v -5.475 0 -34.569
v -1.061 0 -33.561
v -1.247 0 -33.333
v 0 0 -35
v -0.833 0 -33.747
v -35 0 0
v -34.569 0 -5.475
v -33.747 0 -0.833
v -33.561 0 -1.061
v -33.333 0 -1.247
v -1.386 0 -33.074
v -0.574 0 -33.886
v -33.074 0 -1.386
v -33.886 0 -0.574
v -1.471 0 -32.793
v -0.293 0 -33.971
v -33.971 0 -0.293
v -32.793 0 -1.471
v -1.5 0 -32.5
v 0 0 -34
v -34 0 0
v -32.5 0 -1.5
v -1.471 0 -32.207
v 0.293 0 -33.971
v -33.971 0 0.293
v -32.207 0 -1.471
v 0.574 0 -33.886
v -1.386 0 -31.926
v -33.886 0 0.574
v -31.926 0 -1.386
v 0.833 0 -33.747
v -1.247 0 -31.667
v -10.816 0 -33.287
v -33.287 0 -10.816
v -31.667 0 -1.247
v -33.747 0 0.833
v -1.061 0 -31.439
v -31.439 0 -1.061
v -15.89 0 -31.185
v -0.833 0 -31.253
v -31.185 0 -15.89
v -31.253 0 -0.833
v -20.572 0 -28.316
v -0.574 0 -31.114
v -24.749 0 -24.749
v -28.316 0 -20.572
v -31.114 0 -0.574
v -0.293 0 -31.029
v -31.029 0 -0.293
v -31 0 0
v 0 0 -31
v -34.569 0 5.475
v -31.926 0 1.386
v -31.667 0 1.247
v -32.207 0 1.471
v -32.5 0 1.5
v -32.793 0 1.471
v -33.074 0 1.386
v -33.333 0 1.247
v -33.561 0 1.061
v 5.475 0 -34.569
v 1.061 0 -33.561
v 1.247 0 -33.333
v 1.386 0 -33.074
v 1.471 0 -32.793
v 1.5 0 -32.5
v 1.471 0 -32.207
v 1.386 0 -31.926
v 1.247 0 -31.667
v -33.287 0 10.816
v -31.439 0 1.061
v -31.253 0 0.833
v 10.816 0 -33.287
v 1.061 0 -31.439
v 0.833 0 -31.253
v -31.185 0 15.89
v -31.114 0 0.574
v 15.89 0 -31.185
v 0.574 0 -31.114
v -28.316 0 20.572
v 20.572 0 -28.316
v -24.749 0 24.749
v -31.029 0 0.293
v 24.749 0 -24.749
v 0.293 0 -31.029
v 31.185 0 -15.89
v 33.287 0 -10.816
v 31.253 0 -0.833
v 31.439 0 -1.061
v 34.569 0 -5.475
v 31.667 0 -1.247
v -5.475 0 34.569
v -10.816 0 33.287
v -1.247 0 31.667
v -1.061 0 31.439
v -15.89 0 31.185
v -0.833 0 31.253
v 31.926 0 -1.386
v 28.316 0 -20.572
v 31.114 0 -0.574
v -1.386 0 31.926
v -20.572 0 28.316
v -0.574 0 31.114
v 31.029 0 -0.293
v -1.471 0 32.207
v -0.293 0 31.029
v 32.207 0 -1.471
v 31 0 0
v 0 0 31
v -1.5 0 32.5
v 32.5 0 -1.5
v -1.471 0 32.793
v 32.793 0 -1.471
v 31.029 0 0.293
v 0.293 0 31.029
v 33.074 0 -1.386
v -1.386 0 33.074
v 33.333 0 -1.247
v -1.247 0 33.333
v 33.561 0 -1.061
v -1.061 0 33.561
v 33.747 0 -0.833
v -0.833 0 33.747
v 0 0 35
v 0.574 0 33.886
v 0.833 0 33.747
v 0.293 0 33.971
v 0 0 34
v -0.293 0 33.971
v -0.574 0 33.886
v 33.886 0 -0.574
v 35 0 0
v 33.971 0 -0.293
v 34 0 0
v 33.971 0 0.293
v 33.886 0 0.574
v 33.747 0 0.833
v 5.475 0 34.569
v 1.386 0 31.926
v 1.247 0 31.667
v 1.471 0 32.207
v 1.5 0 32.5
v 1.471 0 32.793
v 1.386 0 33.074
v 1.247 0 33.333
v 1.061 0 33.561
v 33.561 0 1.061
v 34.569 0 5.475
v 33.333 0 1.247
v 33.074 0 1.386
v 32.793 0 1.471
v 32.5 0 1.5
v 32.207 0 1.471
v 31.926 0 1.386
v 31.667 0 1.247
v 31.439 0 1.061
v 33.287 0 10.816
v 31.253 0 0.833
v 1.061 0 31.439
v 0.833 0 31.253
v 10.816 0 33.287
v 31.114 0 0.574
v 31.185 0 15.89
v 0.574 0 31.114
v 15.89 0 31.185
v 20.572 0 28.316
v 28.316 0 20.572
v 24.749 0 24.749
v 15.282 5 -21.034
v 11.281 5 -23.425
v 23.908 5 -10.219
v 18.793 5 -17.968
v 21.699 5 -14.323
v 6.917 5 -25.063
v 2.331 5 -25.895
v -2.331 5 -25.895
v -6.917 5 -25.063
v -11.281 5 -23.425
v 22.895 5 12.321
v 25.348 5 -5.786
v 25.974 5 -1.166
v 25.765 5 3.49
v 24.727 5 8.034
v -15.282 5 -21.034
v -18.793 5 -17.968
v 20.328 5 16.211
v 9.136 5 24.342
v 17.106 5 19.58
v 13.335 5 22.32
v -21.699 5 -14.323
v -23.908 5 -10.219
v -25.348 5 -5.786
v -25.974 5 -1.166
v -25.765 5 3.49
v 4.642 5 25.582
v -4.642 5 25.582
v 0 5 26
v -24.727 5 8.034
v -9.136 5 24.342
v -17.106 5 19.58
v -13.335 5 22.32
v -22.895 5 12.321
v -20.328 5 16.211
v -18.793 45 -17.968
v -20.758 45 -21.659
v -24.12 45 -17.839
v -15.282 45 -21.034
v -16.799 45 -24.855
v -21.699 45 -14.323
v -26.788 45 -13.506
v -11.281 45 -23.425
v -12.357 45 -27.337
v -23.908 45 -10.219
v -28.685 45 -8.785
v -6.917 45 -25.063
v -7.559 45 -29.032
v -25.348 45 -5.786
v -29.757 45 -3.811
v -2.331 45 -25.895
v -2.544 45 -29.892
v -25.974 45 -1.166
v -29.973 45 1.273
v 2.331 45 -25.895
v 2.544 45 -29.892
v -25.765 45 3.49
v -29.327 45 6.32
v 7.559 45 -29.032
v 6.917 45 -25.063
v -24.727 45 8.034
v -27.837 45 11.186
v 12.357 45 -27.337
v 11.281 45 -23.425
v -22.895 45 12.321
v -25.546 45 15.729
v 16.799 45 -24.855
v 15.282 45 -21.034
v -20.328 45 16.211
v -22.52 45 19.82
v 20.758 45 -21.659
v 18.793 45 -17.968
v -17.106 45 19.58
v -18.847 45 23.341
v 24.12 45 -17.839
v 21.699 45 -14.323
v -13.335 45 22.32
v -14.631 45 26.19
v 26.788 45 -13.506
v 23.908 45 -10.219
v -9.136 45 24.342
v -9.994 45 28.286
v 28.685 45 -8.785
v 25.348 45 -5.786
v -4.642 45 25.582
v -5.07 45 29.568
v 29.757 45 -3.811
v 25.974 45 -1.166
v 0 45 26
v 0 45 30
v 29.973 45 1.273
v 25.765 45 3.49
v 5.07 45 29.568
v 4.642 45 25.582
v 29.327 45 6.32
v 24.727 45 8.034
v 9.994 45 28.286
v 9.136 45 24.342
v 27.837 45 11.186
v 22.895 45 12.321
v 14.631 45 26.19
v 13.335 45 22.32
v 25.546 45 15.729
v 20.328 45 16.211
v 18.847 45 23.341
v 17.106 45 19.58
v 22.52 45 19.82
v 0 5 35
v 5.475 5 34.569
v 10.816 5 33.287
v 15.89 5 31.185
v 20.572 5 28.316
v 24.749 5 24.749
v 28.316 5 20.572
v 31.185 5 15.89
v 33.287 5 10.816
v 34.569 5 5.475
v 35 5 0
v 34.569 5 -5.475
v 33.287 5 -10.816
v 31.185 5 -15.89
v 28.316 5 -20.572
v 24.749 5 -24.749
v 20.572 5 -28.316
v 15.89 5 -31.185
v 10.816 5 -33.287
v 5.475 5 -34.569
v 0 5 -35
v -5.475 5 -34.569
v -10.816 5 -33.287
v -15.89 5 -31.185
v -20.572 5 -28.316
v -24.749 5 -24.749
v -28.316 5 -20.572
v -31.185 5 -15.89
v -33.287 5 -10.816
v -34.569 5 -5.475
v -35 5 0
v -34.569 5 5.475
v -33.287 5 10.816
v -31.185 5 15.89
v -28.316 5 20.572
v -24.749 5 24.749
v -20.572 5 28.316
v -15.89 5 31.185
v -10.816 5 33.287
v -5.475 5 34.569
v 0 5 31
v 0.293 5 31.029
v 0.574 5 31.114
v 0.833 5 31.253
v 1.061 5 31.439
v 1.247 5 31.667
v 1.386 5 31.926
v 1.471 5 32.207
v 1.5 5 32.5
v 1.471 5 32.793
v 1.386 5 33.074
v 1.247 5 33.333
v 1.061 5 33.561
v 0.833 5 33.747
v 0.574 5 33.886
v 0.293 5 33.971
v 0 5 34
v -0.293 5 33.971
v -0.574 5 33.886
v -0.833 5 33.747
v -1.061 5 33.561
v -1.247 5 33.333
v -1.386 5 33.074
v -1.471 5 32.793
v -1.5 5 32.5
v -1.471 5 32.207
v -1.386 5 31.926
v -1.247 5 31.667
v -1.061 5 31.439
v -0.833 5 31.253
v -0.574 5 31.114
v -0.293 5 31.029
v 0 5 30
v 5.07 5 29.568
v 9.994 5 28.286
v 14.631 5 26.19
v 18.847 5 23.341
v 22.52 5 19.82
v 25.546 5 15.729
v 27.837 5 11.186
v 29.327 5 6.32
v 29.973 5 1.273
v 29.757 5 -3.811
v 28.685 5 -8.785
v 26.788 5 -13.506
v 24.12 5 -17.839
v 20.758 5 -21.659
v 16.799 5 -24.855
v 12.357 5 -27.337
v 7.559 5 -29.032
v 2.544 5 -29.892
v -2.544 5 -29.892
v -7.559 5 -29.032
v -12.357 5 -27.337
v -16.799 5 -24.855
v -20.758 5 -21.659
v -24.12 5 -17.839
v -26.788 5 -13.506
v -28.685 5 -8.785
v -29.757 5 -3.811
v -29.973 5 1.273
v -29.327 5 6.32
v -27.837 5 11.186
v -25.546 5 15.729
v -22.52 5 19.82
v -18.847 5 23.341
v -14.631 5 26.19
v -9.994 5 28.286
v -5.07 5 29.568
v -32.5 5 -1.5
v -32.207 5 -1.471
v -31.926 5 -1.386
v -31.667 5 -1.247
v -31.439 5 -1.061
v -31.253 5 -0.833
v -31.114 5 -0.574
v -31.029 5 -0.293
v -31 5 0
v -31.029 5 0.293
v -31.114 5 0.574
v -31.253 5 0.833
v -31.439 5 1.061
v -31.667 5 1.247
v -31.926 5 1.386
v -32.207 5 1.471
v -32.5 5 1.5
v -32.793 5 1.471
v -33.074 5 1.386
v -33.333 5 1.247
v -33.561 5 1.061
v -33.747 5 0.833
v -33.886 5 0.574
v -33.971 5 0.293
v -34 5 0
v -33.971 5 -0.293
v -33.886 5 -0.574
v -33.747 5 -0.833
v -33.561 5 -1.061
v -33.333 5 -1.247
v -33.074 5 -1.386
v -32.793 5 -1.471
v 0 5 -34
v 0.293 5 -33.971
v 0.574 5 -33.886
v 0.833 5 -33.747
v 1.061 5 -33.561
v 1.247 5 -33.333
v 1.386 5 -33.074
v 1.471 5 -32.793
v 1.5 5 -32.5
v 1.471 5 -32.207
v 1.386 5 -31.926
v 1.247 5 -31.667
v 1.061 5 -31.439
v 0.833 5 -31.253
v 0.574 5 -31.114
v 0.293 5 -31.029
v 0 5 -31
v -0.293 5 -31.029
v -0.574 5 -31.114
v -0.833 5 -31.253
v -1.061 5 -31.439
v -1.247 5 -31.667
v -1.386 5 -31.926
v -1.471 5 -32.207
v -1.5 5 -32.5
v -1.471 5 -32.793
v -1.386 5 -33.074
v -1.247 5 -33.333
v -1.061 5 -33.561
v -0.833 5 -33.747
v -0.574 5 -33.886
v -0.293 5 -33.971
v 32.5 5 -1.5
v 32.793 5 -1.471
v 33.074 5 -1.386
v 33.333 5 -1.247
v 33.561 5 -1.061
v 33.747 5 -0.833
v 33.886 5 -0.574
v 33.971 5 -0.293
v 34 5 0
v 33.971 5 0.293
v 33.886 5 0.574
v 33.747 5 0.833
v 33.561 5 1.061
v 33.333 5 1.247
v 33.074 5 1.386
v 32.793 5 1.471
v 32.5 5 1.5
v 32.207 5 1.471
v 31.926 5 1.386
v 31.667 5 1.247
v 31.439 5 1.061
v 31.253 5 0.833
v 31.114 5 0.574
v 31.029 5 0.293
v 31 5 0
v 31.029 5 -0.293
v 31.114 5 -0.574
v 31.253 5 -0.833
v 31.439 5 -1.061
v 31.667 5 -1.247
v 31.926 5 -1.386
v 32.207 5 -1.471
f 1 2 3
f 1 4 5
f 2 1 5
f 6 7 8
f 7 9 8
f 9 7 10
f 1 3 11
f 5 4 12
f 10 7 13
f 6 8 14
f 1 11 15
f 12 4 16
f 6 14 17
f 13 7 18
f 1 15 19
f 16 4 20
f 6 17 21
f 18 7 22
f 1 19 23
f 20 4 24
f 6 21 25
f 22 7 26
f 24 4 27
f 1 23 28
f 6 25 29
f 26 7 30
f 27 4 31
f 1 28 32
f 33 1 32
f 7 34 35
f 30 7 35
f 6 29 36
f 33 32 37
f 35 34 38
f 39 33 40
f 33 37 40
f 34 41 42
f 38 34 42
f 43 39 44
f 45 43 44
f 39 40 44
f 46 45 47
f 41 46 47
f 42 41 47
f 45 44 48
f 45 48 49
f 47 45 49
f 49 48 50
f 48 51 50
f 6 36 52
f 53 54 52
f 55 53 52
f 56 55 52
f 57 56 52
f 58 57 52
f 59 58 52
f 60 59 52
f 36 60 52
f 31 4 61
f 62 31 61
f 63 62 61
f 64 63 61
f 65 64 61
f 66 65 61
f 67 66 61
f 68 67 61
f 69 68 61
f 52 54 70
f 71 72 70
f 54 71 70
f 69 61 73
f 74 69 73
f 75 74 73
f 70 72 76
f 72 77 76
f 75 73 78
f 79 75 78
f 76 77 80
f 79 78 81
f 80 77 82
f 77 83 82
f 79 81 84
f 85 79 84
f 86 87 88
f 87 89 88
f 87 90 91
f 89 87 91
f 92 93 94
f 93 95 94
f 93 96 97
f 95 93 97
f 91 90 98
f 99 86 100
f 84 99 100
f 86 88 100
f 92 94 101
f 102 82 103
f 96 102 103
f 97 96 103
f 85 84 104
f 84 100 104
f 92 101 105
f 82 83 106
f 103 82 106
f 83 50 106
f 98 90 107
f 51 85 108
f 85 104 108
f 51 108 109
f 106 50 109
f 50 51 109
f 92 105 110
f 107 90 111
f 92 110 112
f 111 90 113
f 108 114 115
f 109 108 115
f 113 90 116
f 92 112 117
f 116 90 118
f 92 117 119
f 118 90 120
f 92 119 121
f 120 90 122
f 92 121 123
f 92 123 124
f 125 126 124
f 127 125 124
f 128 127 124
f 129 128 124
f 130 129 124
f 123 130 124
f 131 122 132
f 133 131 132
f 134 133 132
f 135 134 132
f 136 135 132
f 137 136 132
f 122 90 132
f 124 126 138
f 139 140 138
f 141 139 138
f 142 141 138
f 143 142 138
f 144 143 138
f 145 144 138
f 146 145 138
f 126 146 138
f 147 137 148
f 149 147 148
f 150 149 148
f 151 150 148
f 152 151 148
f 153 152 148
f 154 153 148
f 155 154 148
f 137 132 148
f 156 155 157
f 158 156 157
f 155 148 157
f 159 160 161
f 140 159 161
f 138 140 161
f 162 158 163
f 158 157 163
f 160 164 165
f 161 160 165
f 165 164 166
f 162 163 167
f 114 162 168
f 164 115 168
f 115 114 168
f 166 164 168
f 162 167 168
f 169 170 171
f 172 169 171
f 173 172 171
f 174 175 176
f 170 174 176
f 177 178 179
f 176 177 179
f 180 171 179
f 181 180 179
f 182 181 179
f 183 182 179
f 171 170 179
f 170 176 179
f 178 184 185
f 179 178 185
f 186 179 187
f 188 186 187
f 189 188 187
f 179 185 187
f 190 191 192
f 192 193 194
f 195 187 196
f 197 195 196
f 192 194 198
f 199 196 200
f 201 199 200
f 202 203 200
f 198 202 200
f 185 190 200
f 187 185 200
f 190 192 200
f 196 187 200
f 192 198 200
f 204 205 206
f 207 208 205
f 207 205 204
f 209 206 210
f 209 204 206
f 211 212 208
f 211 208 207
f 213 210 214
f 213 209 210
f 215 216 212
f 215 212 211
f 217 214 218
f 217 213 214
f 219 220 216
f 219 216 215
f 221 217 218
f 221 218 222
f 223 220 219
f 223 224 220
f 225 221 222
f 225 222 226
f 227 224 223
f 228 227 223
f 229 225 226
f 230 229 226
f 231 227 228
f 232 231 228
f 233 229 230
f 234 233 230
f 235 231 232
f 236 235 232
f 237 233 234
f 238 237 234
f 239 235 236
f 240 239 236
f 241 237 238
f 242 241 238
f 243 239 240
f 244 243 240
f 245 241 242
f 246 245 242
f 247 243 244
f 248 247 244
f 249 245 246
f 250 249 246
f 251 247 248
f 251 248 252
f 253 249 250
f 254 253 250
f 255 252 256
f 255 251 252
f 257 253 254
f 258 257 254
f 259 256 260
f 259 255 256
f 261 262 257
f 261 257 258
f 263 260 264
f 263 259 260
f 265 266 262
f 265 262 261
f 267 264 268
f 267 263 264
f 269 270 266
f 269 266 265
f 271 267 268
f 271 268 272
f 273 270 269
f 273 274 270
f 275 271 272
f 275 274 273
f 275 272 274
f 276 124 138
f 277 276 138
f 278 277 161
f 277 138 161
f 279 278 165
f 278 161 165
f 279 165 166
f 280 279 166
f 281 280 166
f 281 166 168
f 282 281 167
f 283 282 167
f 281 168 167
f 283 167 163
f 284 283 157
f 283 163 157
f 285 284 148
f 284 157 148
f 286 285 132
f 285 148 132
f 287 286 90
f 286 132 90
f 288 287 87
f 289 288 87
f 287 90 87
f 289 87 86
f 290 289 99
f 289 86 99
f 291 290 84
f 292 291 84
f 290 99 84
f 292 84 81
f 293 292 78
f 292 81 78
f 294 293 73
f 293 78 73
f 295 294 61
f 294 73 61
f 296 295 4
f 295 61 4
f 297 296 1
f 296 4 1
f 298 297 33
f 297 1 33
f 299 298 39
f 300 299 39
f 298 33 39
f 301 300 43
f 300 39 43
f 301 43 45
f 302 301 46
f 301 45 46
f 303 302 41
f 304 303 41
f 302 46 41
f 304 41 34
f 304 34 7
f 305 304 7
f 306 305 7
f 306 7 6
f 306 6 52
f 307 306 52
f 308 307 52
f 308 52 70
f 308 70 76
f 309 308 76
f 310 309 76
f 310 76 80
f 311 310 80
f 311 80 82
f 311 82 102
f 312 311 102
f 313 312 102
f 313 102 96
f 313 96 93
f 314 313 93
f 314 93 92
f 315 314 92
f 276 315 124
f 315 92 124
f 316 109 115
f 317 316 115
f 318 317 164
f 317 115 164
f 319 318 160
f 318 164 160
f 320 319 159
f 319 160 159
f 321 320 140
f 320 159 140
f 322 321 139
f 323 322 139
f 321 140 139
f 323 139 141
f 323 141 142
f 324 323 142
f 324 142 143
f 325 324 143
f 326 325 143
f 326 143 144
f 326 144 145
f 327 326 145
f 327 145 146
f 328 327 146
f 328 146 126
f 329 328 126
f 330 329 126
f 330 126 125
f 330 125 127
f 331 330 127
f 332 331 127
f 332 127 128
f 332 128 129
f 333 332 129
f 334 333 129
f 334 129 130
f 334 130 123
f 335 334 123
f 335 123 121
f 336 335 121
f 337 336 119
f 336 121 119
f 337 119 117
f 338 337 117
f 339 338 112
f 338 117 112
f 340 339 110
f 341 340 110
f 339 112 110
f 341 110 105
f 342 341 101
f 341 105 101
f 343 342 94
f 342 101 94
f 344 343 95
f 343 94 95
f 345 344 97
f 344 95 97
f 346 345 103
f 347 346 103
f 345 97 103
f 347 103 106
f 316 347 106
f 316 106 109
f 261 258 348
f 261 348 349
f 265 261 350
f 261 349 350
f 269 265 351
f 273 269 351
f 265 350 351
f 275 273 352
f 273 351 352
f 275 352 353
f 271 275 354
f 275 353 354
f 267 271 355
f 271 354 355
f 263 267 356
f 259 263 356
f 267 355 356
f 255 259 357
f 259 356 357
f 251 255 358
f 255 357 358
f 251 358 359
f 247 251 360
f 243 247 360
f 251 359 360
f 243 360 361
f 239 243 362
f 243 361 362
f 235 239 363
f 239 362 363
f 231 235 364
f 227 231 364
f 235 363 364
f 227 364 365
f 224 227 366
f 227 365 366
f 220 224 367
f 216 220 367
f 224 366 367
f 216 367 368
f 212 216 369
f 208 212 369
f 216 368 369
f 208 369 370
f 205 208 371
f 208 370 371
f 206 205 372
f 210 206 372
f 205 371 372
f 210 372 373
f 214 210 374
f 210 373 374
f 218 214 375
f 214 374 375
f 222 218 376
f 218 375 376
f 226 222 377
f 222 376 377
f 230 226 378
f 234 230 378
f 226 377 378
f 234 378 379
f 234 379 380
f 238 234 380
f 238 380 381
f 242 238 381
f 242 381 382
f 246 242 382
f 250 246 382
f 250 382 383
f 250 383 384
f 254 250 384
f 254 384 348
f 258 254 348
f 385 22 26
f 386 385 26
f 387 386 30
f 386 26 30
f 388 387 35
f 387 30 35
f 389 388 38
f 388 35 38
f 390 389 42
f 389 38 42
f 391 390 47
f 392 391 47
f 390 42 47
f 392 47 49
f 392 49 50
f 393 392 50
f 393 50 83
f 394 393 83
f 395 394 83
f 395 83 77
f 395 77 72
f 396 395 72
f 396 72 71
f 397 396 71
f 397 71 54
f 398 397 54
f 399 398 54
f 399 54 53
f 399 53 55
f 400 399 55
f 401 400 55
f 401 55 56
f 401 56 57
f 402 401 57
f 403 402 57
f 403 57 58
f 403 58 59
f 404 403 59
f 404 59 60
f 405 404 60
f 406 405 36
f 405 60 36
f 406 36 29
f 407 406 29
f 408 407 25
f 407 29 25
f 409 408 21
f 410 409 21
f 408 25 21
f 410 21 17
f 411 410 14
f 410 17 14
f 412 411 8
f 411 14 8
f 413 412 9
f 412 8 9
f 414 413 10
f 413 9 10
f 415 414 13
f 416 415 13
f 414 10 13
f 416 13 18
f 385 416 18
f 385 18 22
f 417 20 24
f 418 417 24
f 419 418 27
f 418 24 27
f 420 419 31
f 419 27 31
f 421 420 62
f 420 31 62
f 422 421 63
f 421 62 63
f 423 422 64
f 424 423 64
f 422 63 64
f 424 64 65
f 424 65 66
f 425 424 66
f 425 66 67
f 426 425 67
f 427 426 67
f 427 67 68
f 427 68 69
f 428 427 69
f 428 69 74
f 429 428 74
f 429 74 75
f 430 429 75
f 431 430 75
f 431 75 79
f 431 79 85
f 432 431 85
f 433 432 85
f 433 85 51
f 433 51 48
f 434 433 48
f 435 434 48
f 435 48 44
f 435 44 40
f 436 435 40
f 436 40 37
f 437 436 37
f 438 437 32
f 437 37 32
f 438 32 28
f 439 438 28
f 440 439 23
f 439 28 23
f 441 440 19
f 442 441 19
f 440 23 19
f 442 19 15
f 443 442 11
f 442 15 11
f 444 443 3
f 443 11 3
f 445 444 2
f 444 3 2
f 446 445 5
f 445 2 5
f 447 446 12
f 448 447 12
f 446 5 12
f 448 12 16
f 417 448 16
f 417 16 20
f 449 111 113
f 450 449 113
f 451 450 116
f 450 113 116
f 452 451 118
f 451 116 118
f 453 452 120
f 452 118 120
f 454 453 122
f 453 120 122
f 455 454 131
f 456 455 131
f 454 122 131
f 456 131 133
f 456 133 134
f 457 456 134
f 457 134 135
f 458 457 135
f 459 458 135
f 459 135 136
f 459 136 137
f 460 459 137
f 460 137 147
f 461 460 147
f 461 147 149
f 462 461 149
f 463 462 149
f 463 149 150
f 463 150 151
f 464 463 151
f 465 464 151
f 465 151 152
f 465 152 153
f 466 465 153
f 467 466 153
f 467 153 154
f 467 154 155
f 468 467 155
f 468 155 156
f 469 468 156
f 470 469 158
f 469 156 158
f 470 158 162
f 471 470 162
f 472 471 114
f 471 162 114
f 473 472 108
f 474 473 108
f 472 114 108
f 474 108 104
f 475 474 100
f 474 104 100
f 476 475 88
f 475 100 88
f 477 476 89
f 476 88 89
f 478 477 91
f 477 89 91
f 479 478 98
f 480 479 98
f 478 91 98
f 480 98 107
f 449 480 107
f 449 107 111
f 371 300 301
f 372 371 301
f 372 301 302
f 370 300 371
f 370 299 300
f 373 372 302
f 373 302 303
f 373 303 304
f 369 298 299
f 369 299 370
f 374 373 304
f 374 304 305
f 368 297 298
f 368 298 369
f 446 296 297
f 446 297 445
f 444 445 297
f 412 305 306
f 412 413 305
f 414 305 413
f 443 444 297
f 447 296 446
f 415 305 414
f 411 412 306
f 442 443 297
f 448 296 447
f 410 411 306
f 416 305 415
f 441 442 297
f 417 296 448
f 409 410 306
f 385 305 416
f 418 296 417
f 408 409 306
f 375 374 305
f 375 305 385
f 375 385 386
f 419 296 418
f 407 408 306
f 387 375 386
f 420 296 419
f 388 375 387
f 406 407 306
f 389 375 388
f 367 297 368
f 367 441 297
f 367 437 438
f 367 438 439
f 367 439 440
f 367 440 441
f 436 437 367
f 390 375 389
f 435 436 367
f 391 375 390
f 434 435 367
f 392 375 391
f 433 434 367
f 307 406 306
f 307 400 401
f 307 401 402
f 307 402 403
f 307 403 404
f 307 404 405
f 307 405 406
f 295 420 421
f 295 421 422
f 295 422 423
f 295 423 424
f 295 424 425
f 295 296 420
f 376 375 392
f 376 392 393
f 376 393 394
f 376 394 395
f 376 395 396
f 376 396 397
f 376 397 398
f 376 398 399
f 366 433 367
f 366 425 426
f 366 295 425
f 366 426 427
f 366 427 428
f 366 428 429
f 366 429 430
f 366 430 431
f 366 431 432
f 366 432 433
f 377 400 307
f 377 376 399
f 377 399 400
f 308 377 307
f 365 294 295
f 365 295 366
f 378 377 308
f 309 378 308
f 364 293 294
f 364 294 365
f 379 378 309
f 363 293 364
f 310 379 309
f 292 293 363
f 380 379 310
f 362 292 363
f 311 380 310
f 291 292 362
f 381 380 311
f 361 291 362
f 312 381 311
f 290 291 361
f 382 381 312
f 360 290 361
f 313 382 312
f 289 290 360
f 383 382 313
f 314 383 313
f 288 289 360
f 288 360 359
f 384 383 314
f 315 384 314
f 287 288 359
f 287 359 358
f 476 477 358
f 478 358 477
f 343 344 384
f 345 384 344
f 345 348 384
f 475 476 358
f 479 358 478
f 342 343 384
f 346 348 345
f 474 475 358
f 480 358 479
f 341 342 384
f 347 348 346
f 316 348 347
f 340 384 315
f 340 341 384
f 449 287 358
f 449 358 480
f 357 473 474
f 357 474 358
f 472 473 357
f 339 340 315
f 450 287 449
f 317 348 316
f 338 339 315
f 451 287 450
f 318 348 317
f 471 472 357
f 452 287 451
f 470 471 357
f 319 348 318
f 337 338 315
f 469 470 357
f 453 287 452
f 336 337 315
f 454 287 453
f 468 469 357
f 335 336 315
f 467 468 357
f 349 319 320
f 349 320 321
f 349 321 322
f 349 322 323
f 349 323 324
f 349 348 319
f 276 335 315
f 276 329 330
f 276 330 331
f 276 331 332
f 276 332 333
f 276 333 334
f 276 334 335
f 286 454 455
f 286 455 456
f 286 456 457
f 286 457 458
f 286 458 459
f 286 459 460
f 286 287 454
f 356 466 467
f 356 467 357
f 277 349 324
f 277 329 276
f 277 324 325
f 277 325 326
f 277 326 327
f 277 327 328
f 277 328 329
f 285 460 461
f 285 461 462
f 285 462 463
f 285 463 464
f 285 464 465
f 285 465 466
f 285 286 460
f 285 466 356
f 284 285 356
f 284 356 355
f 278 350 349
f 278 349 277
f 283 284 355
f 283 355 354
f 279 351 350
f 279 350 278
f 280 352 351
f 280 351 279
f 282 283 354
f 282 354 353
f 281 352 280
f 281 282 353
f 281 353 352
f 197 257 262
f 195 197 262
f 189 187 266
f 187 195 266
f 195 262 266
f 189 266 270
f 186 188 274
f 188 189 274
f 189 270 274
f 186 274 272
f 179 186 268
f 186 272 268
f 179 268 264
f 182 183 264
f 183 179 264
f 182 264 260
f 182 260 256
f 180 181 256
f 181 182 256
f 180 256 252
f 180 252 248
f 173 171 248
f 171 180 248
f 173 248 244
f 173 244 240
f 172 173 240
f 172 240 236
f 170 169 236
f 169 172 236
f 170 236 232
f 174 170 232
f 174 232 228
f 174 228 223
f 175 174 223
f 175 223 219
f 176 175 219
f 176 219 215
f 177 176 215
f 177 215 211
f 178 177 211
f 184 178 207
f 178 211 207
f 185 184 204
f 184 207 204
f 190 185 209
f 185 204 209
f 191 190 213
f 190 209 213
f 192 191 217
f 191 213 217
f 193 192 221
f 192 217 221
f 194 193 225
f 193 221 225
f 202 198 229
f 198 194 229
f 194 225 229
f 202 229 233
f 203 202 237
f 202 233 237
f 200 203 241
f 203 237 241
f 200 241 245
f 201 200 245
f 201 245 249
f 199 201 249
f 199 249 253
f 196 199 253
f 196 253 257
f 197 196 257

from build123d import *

# Parameters (mm, degrees)
SKETCH1_R           = 35
BOSS_EXTRUDE1_DEPTH = 5
SKETCH2_R           = 30
BOSS_EXTRUDE2_DEPTH = 40
SKETCH3_R           = 26
CUT_EXTRUDE2_DEPTH  = 60
SKETCH4_R           = 1.5
CUT_EXTRUDE3_DEPTH  = 60
BOSS_EXTRUDE3_START = -5
SKETCH5_R           = 26
BOSS_EXTRUDE3_DEPTH = 5


with BuildPart() as part:
    # Sketch1 → Boss-Extrude1 (new body)
    with BuildSketch(Plane(origin=(0, 0, 0), x_dir=(1, 0, 0), z_dir=(0, 1, 0))):
        with Locations(Location((0, 0, 0), (0, 0, 270))):
            Circle(SKETCH1_R)
    extrude(amount=BOSS_EXTRUDE1_DEPTH)

    # Sketch2 → Boss-Extrude2 (add)
    with BuildSketch(Plane(origin=(0, 5, 0), x_dir=(1, 0, 0), z_dir=(0, 1, 0))):
        with Locations(Location((0, 0, 0), (0, 0, 270))):
            Circle(SKETCH2_R)
    extrude(amount=BOSS_EXTRUDE2_DEPTH)

    # Sketch3 → Cut-Extrude2 (cut)
    with BuildSketch(Plane(origin=(0, 45, 0), x_dir=(1, 0, 0), z_dir=(0, 1, 0))):
        with Locations(Location((0, 0, 0), (0, 0, 270))):
            Circle(SKETCH3_R)
    extrude(amount=-CUT_EXTRUDE2_DEPTH, mode=Mode.SUBTRACT)

    # Sketch4 → Cut-Extrude3 (cut)
    with BuildSketch(Plane.XZ):
        with Locations(Location((0, 32.5, 0), (0, 0, 270))):
            Circle(SKETCH4_R)
        with Locations(Location((32.5, 0, 0), (0, 0, 270))):
            Circle(SKETCH4_R)
        with Locations(Location((0, -32.5, 0), (0, 0, 270))):
            Circle(SKETCH4_R)
        with Locations(Location((-32.5, 0, 0), (0, 0, 270))):
            Circle(SKETCH4_R)
    extrude(amount=-CUT_EXTRUDE3_DEPTH, mode=Mode.SUBTRACT)

    # Sketch5 → Boss-Extrude3 (add)
    with BuildSketch(Plane.XZ.offset(BOSS_EXTRUDE3_START)):
        with Locations(Location((0, 0, 0), (0, 0, 90))):
            Circle(SKETCH5_R)
    extrude(amount=BOSS_EXTRUDE3_DEPTH)


solid = part.part
